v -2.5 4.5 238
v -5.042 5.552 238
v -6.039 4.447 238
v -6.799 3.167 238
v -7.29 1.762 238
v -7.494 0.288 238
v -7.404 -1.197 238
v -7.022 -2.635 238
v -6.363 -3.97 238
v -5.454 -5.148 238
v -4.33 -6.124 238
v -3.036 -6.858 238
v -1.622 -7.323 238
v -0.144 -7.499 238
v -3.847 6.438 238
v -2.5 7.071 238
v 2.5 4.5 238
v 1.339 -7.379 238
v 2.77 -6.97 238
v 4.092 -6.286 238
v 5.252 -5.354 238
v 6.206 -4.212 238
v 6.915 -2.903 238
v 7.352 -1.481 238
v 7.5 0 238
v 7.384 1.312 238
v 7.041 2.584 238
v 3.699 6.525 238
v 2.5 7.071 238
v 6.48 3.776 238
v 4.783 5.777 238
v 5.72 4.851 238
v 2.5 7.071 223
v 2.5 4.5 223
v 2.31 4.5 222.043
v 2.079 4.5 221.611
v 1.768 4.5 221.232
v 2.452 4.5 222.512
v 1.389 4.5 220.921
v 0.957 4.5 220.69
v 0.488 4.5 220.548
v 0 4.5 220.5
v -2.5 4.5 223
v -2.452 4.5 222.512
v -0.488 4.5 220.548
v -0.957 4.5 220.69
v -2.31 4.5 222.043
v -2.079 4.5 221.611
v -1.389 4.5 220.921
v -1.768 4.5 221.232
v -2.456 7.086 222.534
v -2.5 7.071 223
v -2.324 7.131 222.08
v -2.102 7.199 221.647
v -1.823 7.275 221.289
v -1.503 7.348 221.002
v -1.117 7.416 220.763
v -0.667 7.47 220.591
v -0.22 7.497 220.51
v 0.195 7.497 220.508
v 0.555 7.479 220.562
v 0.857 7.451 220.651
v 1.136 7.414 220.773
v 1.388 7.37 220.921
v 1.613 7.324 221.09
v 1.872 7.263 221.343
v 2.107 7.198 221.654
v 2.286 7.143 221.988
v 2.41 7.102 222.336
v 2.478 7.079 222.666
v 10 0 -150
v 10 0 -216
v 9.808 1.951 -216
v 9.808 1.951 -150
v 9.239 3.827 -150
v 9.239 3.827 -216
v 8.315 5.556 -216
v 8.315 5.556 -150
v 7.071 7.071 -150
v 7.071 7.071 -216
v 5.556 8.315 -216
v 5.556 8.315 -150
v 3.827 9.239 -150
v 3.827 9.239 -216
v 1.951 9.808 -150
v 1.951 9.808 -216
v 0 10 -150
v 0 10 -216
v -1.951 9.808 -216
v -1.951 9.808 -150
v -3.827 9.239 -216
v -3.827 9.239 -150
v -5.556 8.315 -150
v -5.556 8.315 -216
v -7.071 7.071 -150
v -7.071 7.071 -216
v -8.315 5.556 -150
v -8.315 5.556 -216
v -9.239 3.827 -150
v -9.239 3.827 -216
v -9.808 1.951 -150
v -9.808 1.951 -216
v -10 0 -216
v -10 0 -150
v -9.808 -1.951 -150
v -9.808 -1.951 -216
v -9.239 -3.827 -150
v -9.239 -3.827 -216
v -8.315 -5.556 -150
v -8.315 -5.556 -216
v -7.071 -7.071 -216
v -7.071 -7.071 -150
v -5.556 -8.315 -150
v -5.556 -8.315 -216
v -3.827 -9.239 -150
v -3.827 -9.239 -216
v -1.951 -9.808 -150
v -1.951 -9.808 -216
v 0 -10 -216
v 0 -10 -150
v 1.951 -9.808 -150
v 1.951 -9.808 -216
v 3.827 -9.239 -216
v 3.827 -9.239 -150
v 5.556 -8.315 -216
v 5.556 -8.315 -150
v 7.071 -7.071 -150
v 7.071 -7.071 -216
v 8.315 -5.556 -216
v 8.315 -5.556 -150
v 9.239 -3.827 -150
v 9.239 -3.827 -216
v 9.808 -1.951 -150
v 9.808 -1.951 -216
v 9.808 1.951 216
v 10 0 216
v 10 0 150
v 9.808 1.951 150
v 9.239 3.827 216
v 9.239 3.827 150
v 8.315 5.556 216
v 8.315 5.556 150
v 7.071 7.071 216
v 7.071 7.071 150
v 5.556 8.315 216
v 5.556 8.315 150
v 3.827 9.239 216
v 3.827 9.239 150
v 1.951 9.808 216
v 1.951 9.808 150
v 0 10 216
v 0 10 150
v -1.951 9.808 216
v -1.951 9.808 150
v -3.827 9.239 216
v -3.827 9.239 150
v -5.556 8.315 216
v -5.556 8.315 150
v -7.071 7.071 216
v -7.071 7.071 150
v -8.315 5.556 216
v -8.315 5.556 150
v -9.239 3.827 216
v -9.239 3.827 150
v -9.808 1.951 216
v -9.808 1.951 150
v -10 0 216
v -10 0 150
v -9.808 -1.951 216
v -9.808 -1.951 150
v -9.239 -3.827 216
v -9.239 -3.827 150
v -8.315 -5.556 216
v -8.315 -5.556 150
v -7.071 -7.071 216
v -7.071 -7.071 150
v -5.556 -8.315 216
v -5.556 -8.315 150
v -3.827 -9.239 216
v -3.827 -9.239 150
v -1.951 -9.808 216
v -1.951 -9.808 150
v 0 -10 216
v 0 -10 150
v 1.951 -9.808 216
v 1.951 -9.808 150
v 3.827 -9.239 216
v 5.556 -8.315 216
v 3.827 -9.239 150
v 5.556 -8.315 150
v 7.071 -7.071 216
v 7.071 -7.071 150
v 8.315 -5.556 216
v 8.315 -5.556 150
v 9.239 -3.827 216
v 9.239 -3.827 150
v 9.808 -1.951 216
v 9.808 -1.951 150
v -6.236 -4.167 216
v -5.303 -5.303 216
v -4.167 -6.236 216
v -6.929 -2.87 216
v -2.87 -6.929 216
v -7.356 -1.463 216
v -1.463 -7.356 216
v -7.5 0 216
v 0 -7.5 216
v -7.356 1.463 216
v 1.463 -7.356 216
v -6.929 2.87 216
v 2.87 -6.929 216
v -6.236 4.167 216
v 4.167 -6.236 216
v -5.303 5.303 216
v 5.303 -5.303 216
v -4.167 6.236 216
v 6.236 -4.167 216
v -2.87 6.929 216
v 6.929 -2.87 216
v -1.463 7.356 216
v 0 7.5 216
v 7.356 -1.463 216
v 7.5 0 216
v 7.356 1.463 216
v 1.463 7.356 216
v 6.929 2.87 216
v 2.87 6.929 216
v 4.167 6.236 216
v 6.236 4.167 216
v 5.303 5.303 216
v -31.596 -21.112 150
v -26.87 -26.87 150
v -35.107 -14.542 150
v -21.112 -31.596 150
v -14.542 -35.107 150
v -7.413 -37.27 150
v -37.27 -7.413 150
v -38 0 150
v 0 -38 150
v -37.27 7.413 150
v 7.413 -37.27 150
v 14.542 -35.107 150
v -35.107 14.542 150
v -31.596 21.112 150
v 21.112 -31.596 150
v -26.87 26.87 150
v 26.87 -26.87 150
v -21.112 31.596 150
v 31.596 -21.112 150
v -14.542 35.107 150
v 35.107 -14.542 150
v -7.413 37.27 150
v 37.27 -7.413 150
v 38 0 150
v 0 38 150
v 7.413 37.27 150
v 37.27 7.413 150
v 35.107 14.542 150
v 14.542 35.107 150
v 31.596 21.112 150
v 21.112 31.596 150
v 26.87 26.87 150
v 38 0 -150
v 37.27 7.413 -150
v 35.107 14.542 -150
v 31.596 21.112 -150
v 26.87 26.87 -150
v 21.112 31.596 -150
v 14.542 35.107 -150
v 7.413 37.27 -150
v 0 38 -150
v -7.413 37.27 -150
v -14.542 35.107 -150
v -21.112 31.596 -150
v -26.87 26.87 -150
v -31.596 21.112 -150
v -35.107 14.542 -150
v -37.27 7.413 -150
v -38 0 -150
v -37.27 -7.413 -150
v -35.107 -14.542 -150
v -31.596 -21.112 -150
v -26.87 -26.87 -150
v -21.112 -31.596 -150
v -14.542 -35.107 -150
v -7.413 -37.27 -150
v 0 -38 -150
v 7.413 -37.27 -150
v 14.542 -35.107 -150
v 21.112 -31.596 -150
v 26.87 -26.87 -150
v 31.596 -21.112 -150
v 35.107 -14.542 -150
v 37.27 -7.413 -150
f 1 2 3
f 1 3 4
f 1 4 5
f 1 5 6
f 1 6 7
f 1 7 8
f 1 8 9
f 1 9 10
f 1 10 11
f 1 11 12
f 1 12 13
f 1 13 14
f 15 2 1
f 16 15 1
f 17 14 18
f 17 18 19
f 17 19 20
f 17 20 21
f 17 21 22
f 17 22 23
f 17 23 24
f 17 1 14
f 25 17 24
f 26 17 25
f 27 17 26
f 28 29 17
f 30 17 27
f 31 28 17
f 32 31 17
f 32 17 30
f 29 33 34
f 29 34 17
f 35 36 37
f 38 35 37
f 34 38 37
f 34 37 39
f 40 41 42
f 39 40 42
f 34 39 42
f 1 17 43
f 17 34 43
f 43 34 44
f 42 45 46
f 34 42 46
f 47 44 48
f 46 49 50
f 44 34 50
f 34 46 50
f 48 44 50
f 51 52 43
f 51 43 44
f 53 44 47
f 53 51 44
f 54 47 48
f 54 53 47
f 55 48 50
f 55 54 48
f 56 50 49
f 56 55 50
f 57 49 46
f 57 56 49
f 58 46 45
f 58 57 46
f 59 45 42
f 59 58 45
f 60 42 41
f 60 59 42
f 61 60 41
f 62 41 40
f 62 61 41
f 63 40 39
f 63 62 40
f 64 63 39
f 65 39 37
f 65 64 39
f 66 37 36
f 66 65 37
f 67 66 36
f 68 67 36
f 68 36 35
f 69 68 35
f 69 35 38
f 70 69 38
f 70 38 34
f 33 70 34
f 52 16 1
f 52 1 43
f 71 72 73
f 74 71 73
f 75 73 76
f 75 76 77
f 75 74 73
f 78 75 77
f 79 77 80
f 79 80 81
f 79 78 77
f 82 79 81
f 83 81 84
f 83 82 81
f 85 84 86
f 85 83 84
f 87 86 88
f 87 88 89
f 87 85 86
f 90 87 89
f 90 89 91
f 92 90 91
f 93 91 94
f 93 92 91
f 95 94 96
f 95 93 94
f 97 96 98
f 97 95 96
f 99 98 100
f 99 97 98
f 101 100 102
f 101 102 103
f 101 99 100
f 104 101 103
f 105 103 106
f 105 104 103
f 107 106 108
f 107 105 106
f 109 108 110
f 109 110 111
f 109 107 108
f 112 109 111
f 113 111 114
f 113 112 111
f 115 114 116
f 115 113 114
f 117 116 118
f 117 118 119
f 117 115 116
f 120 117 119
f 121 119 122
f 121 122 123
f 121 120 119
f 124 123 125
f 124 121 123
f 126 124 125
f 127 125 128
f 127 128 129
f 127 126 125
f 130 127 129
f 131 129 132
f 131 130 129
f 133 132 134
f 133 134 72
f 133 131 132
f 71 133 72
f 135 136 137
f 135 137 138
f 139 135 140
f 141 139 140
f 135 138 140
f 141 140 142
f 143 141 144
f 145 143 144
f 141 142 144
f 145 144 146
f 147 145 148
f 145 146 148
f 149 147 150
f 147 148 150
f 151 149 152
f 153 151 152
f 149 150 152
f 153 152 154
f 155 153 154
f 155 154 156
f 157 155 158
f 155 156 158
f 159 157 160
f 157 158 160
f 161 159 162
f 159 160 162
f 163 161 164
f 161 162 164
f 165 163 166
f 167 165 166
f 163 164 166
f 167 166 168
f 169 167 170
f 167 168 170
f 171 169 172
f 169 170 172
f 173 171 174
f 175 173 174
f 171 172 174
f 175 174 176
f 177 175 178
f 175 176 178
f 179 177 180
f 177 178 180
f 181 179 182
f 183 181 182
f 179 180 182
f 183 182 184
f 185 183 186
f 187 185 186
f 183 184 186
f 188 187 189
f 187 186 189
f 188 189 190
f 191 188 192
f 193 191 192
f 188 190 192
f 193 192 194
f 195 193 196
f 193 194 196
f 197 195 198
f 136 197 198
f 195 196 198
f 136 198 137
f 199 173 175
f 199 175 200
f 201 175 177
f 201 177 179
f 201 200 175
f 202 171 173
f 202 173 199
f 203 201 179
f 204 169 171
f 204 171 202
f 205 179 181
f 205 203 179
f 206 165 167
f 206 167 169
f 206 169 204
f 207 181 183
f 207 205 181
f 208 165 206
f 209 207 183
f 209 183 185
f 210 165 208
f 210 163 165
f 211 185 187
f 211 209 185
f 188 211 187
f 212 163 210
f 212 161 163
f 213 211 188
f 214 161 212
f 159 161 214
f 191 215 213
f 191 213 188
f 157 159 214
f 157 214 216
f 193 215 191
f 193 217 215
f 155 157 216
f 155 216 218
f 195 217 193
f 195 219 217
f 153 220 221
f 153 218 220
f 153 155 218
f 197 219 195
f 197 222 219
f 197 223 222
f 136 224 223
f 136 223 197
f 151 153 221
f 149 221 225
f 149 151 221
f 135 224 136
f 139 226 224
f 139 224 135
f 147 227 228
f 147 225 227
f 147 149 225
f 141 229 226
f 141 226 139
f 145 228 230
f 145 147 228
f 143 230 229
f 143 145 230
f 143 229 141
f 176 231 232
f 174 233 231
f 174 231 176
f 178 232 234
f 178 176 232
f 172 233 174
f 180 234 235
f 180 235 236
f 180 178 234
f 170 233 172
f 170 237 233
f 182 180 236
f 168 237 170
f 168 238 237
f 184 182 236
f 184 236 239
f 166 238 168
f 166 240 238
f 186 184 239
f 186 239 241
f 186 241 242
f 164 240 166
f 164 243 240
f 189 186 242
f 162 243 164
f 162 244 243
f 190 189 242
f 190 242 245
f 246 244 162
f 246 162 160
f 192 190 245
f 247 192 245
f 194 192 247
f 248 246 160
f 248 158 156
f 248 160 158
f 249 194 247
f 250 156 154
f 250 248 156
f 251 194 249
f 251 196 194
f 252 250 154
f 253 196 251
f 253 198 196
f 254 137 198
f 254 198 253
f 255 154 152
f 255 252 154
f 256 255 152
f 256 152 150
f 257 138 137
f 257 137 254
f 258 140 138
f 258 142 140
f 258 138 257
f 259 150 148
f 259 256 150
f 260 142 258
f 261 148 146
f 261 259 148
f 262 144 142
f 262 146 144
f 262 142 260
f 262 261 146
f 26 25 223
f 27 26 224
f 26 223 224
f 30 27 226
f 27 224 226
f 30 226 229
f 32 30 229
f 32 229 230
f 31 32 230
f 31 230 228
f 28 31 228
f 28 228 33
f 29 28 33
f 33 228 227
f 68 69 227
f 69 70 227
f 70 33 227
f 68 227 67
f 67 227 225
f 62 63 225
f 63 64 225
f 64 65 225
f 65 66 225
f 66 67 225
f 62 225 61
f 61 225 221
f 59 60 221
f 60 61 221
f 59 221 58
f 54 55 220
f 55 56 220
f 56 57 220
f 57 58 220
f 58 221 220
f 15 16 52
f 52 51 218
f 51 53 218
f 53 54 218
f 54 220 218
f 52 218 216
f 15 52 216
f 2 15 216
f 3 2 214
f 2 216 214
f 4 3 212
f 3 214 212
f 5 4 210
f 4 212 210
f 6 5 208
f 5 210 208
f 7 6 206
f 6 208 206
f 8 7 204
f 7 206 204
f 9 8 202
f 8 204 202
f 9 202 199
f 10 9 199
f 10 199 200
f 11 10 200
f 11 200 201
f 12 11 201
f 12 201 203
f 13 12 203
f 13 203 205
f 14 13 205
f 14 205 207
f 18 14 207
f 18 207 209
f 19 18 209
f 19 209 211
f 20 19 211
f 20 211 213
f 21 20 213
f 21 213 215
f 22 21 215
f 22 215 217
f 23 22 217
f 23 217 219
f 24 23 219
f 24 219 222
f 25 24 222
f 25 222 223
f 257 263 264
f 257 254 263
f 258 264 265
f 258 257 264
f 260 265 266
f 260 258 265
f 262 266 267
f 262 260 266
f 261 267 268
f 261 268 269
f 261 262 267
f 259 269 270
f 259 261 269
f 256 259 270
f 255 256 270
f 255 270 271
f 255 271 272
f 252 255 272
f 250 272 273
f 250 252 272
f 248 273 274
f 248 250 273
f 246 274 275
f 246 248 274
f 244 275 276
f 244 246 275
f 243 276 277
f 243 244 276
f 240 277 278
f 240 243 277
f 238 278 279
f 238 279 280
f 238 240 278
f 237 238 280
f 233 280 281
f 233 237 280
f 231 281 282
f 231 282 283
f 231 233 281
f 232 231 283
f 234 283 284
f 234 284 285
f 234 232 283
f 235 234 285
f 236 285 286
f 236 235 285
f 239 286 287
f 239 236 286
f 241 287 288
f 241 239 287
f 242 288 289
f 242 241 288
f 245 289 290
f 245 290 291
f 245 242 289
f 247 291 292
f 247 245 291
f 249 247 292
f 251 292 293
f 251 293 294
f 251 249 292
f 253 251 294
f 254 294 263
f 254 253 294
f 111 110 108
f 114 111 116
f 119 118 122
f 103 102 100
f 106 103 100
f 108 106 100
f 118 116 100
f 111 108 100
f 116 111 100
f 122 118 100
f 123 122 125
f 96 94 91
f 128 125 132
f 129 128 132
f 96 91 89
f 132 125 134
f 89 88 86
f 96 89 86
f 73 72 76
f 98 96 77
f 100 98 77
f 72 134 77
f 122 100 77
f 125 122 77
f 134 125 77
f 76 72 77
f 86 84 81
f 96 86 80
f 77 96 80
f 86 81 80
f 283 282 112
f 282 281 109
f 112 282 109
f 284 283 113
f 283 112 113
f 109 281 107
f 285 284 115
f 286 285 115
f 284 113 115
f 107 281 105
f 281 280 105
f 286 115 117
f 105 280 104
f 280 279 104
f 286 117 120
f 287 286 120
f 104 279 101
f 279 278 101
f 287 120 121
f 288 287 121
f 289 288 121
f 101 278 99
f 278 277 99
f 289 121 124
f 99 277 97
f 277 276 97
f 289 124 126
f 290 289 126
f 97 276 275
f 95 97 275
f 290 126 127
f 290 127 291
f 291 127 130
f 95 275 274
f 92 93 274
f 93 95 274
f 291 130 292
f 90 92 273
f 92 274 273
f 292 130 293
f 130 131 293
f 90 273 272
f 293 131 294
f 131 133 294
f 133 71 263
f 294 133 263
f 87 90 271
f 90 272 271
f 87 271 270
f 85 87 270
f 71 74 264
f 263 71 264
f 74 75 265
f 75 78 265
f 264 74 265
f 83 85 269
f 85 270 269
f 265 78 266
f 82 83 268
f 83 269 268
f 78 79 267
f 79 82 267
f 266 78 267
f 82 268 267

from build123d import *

# Parameters (mm, degrees)
SKETCH_1_R          = 38
EXTRUDE_1_DEPTH     = 150
SKETCH_2_R          = 10
EXTRUDE_2_DEPTH     = 66
SKETCH_3_R          = 7.5
EXTRUDE_3_DEPTH     = 22
CUT_EXTRUDE_START   = 7.5
CUT_EXTRUDE_1_DEPTH = 3


with BuildPart() as part:
    # 草图1 → 凸台-拉伸1 (new, symmetric)
    with BuildSketch(Plane.XY):
        Circle(SKETCH_1_R)
    extrude(amount=EXTRUDE_1_DEPTH, both=True)

    # 草图2 → 凸台-拉伸2 (add)
    with BuildSketch(Plane.XY.offset(150)):
        Circle(SKETCH_2_R)
    extrude_2 = extrude(amount=EXTRUDE_2_DEPTH)

    # 镜向1: 凸台-拉伸2 across plane
    add(extrude_2.mirror(Plane.XY))

    # 草图3 → 凸台-拉伸3 (add)
    with BuildSketch(Plane.XY.offset(216)):
        Circle(SKETCH_3_R)
    extrude(amount=EXTRUDE_3_DEPTH)

    # 草图4 → 切除-拉伸1 (cut)
    with BuildSketch(Plane(origin=(0, 0, 0), x_dir=(1, 0, 0), z_dir=(0, 1, 0)).offset(CUT_EXTRUDE_START)):
        with BuildLine():
            Line((-2.5, -238), (-2.5, -223))
            ThreePointArc((-2.5, -223), (0, -220.5), (2.5, -223))
            Line((2.5, -223), (2.5, -238))
            ThreePointArc((2.5, -238), (0, -240.5), (-2.5, -238))
        make_face()
    extrude(amount=-CUT_EXTRUDE_1_DEPTH, mode=Mode.SUBTRACT)


solid = part.part
